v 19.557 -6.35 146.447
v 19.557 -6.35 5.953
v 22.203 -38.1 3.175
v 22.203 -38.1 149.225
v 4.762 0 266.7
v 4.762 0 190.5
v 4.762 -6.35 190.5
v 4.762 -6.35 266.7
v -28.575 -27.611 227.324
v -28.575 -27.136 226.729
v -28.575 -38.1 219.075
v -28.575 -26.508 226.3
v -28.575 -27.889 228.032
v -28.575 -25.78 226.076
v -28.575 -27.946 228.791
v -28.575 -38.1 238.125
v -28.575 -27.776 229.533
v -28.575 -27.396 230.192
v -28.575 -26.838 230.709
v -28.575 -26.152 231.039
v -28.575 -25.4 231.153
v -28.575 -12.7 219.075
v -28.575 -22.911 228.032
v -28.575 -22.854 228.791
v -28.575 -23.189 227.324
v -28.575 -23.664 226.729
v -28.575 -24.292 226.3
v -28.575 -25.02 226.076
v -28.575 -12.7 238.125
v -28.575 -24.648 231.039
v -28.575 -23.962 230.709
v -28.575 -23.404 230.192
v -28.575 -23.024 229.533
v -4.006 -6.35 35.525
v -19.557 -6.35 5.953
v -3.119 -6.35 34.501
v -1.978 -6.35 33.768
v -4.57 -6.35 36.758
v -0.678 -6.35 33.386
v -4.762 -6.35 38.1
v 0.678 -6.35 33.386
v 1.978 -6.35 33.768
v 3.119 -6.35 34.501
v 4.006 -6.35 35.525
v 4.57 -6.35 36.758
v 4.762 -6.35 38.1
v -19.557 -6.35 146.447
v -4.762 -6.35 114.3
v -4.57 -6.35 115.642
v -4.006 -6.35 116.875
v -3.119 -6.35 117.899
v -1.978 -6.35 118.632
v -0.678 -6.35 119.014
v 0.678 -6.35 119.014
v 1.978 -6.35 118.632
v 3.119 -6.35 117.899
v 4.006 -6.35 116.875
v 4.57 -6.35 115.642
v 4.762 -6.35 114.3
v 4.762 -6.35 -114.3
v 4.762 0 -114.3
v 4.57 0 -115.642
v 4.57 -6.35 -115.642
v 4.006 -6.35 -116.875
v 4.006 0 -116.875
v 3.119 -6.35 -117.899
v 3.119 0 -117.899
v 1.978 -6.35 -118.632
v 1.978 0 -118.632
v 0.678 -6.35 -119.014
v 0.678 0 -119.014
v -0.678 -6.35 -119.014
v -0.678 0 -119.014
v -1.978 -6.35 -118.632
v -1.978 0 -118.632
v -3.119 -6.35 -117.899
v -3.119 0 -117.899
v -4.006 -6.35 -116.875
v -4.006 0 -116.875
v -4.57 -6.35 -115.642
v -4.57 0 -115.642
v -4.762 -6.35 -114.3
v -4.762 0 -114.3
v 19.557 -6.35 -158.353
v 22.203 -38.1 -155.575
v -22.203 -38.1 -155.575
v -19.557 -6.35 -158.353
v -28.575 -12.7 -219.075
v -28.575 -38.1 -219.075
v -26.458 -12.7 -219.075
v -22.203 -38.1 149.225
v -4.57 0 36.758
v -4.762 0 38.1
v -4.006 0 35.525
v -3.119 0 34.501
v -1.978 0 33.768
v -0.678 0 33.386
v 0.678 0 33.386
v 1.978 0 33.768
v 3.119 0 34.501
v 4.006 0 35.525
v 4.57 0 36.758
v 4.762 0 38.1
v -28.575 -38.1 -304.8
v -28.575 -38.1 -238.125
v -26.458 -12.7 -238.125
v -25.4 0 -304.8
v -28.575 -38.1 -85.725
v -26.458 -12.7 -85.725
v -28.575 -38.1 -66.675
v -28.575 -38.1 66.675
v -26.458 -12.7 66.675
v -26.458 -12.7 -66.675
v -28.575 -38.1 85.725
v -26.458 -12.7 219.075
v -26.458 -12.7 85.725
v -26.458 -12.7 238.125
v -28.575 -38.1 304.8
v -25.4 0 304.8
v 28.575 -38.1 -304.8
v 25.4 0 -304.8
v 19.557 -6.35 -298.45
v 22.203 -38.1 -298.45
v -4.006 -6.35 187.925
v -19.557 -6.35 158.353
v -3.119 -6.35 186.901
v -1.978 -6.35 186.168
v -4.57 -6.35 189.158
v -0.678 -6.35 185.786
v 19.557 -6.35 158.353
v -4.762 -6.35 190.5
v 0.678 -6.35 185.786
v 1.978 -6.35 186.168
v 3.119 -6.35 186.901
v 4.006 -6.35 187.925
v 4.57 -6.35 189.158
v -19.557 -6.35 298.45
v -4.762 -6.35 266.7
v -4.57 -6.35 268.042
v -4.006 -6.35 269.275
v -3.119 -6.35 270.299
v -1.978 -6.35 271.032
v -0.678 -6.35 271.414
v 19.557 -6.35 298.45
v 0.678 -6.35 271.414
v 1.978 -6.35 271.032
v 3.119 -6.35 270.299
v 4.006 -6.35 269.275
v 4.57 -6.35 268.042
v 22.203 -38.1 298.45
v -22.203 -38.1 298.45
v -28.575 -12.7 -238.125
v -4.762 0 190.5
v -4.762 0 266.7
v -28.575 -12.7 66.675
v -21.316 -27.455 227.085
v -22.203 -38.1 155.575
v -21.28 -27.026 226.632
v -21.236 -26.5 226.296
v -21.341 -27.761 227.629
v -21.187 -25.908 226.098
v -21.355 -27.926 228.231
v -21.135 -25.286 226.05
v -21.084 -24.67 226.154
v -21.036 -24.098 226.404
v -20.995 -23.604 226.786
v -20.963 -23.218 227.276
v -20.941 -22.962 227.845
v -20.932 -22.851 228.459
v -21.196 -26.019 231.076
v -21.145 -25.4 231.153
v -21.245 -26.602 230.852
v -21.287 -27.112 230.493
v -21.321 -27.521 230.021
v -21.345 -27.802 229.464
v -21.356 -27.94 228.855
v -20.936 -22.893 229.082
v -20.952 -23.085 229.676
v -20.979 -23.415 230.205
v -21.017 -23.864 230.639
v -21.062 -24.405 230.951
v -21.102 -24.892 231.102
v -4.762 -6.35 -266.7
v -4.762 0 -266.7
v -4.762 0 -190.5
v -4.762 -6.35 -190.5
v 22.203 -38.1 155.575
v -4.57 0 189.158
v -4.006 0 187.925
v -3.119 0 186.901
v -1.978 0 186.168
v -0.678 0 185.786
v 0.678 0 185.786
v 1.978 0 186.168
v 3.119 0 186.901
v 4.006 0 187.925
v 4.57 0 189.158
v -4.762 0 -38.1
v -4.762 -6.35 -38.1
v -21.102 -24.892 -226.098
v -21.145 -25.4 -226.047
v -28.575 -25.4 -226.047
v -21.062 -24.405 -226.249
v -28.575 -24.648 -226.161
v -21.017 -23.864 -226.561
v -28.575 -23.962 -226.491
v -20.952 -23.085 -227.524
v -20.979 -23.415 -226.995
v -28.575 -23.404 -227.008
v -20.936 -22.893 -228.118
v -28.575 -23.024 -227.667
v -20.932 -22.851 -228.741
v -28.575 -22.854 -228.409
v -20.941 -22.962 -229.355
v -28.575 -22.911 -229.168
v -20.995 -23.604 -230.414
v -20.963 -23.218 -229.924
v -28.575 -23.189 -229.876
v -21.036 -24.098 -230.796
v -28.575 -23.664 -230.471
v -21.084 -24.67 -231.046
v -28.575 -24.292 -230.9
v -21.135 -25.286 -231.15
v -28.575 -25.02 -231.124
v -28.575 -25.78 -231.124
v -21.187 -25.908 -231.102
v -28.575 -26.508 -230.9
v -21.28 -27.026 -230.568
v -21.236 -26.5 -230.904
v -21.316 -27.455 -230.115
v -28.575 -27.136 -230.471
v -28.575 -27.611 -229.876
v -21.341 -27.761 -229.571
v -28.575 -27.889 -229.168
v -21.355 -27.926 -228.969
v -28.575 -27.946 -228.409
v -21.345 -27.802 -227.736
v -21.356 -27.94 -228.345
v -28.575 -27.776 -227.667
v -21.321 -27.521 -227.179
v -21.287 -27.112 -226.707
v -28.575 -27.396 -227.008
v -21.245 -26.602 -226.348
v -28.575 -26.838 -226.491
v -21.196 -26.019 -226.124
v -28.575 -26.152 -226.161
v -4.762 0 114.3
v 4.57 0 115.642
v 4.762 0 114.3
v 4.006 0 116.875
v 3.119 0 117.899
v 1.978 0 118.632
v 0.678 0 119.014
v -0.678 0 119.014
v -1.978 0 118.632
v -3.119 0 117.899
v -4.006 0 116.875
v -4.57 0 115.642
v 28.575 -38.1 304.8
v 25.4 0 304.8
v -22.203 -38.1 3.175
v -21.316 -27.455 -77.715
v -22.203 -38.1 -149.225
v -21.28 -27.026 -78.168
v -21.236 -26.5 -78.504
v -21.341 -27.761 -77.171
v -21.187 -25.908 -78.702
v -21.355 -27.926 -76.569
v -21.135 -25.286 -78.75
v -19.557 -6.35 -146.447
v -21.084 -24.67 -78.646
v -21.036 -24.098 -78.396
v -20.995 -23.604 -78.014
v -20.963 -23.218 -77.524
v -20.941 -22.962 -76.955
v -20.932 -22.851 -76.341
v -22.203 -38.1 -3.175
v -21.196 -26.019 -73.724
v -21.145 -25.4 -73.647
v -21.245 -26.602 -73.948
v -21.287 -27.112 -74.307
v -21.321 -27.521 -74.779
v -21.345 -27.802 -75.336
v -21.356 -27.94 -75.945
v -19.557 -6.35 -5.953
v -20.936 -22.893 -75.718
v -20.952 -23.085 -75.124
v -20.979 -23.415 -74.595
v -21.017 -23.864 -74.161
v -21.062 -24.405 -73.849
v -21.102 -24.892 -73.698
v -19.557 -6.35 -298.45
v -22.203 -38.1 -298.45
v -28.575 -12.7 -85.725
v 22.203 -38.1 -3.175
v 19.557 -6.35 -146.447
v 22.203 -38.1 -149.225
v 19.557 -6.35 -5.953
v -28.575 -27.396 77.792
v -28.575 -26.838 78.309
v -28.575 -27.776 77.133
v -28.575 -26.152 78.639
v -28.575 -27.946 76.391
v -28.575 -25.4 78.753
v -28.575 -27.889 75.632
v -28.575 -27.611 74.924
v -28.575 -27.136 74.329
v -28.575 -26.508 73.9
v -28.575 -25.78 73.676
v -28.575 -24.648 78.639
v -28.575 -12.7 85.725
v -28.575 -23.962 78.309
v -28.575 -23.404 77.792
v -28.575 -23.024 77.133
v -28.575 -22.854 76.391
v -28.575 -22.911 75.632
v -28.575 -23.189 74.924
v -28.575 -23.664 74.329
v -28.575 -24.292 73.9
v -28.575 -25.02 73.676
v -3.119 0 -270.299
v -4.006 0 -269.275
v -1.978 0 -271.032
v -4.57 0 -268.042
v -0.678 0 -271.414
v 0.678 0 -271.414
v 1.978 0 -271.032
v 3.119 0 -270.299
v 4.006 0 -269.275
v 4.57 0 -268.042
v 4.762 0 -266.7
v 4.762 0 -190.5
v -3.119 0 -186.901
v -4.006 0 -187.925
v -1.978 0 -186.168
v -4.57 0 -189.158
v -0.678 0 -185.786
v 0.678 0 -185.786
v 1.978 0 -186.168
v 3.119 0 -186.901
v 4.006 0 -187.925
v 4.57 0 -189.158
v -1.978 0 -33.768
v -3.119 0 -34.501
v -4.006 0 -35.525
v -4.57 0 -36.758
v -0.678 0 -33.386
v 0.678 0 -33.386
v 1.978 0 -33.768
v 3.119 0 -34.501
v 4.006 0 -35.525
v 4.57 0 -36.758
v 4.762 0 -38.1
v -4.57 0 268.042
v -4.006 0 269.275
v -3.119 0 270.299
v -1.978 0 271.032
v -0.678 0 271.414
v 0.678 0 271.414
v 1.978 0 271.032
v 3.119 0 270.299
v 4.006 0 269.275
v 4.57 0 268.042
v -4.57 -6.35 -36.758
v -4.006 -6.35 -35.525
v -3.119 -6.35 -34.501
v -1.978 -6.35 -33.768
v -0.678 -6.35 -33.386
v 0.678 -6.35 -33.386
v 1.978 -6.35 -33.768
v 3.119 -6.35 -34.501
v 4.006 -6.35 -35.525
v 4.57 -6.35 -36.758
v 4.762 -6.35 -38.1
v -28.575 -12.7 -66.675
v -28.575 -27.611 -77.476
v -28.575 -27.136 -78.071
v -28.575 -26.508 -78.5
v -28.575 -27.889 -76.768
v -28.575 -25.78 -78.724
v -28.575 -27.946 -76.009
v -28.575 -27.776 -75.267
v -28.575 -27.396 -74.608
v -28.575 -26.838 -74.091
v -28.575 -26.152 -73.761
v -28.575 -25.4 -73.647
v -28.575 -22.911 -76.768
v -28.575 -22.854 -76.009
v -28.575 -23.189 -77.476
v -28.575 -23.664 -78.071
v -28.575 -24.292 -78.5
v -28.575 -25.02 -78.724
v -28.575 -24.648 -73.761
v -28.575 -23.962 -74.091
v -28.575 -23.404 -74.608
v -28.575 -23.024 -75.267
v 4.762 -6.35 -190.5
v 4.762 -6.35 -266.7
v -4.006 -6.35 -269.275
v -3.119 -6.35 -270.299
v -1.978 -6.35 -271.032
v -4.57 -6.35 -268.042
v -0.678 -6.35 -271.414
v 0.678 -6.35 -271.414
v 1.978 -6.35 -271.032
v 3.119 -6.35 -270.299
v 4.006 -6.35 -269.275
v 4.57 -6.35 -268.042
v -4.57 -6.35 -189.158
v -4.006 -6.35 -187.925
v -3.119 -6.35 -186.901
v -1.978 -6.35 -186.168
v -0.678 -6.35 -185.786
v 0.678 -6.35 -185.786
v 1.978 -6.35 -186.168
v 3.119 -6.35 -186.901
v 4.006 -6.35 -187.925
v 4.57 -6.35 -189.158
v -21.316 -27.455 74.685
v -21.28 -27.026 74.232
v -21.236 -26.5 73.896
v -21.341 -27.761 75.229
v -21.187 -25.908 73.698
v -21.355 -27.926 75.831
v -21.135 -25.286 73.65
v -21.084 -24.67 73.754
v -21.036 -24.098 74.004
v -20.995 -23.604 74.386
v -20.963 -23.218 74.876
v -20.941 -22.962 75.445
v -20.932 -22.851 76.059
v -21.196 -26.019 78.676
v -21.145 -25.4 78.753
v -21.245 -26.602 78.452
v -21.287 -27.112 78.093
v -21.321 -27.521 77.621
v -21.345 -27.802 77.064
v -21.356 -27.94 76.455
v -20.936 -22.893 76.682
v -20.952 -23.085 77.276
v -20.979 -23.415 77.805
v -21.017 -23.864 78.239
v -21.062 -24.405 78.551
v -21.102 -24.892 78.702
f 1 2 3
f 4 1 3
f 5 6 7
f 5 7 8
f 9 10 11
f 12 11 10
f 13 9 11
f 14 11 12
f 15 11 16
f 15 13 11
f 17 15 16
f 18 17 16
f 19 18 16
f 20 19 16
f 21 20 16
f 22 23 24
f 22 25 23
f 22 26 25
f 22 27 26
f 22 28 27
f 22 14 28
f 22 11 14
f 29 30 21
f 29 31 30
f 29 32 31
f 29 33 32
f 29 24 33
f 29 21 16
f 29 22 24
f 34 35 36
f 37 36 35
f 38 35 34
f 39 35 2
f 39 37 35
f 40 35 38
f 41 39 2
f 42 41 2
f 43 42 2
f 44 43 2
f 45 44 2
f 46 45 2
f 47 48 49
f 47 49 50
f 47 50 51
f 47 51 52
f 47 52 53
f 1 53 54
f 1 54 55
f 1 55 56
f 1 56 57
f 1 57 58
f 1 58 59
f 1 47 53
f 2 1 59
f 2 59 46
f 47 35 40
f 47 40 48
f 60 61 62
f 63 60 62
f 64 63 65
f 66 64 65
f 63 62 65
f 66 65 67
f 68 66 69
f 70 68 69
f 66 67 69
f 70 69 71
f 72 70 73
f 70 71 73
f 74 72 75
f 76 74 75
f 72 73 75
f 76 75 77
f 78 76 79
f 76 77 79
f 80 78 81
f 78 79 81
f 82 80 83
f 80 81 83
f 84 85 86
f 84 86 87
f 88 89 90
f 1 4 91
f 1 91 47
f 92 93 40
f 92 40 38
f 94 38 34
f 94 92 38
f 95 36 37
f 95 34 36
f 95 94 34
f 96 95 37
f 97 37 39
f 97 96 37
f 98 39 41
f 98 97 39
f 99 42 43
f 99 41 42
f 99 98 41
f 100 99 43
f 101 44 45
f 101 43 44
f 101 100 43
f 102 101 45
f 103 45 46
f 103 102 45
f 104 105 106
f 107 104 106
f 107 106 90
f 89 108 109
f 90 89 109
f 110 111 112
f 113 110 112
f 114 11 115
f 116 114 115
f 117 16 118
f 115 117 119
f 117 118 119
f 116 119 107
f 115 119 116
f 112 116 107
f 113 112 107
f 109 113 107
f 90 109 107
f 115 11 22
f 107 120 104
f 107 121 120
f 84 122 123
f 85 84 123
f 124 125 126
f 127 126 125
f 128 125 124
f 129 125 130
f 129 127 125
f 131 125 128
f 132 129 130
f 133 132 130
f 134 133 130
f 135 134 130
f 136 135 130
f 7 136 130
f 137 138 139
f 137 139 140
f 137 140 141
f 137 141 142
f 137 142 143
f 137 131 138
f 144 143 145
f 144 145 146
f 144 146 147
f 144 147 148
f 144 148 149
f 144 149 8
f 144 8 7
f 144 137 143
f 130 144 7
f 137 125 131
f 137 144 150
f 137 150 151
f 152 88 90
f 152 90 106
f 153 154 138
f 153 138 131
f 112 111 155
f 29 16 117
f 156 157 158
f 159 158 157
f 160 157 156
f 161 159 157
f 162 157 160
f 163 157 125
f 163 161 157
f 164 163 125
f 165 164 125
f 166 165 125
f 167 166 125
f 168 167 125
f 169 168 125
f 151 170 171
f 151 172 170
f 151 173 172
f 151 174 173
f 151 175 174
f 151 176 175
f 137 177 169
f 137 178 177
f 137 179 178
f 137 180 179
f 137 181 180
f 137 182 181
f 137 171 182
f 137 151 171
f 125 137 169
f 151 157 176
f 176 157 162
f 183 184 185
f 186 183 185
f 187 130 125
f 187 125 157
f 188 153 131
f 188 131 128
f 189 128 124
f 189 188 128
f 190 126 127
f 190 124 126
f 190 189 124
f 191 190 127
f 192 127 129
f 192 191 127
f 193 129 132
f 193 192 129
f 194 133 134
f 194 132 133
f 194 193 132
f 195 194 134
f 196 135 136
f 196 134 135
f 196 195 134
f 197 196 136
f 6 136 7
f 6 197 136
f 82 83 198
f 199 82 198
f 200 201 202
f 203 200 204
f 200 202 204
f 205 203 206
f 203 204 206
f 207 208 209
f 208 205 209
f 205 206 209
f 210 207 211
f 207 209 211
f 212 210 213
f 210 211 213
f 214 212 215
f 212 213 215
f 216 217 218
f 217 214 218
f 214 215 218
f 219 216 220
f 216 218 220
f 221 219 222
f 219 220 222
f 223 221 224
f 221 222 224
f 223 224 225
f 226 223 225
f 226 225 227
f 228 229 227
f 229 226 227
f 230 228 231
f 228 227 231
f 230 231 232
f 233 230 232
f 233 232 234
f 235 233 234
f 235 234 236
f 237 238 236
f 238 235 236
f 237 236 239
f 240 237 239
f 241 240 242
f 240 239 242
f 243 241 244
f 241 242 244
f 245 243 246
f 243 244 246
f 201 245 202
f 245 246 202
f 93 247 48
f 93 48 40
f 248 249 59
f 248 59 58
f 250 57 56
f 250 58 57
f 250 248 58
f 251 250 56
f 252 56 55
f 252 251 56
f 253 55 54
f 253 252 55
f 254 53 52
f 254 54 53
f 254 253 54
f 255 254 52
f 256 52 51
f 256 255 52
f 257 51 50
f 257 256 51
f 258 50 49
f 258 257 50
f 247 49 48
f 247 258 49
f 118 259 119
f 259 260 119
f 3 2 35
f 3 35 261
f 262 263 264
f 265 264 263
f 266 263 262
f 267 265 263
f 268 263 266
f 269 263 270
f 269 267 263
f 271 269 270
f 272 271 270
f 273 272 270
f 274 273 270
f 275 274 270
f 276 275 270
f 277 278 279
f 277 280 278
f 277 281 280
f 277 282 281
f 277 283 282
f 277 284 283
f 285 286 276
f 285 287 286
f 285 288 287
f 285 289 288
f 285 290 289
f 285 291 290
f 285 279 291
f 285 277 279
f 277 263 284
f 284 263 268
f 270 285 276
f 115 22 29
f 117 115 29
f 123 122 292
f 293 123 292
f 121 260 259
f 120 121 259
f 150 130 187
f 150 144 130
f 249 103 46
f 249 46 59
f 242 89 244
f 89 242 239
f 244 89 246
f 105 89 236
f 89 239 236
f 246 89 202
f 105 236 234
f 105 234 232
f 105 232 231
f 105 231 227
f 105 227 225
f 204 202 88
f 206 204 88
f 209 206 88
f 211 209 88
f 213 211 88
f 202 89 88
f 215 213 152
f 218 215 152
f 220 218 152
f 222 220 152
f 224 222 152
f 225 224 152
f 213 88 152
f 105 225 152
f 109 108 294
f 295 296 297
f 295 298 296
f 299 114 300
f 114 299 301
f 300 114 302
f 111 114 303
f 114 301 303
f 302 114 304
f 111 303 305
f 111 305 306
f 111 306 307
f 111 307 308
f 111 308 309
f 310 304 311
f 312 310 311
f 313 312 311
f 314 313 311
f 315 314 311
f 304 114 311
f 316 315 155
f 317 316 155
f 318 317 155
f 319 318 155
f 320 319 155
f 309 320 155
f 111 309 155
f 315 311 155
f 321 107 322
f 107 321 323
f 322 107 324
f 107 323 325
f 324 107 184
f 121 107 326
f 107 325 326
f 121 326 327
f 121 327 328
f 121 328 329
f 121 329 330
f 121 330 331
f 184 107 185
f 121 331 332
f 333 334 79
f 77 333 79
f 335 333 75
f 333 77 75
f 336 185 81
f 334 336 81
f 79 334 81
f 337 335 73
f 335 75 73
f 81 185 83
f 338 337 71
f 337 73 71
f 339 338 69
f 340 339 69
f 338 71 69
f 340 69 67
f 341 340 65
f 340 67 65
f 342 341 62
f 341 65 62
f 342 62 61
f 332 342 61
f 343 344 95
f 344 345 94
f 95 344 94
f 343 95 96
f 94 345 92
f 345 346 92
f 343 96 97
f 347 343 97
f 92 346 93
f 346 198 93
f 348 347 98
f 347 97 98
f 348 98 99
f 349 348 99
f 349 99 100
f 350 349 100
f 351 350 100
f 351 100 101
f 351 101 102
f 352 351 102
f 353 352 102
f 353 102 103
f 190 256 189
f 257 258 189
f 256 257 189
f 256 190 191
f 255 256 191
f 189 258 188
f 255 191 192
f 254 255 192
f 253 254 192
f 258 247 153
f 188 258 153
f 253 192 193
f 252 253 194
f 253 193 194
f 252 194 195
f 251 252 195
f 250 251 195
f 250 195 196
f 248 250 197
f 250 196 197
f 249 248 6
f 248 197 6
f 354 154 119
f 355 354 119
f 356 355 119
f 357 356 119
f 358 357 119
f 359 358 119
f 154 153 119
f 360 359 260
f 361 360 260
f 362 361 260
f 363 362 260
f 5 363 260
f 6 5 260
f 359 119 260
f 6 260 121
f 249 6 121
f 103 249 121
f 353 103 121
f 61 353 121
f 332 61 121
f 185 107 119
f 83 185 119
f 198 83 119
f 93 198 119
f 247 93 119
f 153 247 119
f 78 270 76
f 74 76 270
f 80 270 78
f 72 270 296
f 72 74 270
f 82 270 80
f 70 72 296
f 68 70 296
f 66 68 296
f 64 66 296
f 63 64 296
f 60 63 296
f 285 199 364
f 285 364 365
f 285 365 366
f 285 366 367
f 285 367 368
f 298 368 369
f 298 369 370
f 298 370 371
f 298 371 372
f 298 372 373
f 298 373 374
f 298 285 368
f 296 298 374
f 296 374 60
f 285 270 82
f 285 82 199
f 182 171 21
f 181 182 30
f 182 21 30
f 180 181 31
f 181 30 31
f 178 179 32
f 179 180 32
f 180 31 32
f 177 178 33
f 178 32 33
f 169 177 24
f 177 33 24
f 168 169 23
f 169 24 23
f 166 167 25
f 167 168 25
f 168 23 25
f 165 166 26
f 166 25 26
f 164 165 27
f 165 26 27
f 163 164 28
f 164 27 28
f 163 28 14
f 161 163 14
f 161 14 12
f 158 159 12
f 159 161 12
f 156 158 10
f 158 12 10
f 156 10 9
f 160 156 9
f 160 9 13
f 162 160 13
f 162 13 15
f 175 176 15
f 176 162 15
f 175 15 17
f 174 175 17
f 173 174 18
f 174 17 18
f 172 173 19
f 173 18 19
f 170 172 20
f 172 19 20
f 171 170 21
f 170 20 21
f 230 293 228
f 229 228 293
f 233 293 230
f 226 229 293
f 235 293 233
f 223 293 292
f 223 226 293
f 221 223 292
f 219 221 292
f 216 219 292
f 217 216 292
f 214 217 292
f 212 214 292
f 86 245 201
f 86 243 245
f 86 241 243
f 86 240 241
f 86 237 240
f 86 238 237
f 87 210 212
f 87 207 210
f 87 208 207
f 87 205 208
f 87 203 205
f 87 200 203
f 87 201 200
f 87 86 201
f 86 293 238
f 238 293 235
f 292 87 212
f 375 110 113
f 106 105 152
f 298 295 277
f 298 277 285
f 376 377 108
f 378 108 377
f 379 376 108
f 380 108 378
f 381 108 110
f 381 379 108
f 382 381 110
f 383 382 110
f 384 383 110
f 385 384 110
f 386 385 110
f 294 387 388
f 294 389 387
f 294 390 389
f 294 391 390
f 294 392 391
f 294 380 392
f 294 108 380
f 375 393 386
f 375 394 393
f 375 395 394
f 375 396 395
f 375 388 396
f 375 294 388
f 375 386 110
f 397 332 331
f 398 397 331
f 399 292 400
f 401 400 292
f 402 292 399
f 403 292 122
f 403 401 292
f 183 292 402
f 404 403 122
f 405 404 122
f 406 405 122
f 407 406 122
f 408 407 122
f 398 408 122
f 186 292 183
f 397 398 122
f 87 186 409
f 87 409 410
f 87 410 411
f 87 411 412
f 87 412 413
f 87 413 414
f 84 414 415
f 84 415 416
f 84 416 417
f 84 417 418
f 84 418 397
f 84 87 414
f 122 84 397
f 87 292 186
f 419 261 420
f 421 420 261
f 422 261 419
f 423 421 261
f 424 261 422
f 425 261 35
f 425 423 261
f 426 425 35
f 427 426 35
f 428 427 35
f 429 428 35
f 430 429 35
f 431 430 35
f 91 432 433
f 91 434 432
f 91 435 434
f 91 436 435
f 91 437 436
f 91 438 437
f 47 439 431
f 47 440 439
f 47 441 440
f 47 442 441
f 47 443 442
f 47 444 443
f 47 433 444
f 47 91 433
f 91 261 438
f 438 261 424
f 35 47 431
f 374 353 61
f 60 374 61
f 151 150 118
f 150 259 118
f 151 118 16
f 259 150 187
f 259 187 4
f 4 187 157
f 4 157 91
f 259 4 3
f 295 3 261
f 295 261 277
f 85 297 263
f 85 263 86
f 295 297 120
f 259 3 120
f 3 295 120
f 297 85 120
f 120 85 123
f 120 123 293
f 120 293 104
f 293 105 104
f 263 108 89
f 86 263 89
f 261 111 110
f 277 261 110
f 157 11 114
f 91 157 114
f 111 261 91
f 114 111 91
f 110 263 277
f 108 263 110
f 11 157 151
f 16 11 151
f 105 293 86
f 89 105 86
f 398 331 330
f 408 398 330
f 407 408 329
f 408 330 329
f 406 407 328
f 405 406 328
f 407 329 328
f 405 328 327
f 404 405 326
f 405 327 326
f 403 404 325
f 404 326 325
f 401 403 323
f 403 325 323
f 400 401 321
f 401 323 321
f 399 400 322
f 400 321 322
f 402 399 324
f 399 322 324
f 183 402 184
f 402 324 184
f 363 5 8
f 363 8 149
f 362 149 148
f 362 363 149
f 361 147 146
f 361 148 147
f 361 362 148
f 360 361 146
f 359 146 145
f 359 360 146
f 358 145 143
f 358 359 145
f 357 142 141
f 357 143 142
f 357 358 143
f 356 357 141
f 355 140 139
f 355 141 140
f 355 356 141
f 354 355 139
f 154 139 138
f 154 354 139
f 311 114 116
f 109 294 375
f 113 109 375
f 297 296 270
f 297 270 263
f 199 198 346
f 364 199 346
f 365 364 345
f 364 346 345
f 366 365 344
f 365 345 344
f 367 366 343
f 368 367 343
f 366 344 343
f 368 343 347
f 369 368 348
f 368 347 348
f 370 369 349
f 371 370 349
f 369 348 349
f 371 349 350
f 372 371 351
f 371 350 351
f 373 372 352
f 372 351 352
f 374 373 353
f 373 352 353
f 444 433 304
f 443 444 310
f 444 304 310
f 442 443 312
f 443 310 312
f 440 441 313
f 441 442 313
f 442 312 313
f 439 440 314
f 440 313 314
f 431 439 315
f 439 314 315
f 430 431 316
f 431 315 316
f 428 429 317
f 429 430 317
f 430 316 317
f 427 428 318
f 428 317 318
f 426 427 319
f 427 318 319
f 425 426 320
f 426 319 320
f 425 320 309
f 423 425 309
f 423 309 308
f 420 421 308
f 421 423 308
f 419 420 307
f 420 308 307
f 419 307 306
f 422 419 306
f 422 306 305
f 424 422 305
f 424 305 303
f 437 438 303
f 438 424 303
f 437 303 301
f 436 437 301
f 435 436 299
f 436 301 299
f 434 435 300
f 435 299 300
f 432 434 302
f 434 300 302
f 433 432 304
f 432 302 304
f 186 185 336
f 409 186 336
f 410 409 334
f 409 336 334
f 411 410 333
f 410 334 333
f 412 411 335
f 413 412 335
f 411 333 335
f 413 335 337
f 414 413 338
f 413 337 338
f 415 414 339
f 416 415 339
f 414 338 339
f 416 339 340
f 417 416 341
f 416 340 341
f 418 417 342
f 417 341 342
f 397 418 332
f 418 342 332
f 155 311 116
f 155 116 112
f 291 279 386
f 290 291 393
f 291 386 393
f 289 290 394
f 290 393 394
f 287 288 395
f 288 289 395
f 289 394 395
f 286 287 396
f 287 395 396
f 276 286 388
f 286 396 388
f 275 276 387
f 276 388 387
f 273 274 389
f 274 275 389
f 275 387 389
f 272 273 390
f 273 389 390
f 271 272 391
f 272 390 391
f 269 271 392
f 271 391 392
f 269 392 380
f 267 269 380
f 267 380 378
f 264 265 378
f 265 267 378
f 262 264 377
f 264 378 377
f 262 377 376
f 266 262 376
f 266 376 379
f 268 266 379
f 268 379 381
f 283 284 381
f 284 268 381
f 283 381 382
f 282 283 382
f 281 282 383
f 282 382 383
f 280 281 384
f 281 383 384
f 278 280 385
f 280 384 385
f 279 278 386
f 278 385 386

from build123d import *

# Parameters (mm, degrees)
BOSS_EXTRUDE1_DEPTH          = 304.8
SHELL1_T                     = -6.35
CUT_EXTRUDE1_DEPTH           = 309.49826681
RIB2_START                   = -22.202989535
RIB2_DEPTH                   = 44.40597907
LPATTERN1_COUNT              = 3
LPATTERN1_PITCH              = 152.4
LPATTERN2_COUNT              = 2
LPATTERN2_PITCH              = 152.4
MIRROR1_COPY_1_DEPTH         = 309.49826681
BOSS_EXTRUDE2_REACH          = 314.443
SKETCH5_W                    = 19.05
SKETCH5_H                    = 25.4
MIRROR4_COPY_1_REACH         = 314.443
MIRROR4_COPY_1_SKETCH_W      = 19.05
MIRROR4_COPY_1_SKETCH_H      = 25.4
F_1_4_20_TAPPED_HOLE1_REACH  = 314.443
F_1_4_20_TAPPED_HOLE1_BORE_R = 2.5527


# Read off the part's stored shape, not the designer's step: Rib2
with BuildPart() as part:
    # Sketch1 → Boss-Extrude1 (new, symmetric)
    with BuildSketch(Plane.XY):
        Polygon((28.575, -38.1), (-28.575, -38.1), (-25.4, 0), (25.4, 0), align=None)
    extrude(amount=BOSS_EXTRUDE1_DEPTH, both=True)

    # Shell1
    shell1_openings = [part.faces().sort_by_distance(p)[0] for p in [
        (0, -38.1, 0),
    ]]
    offset(amount=SHELL1_T, openings=shell1_openings, kind=Kind.INTERSECTION)

    # Sketch2 → Cut-Extrude1 (cut, symmetric)
    with BuildSketch(Plane(origin=(0, 0, 0), x_dir=(1, 0, 0), z_dir=(0, 1, 0))):
        with BuildLine():
            Line((4.7625, -38.1), (4.7625, -114.3))
            ThreePointArc((4.7625, -114.3), (0, -119.0625), (-4.7625, -114.3))
            Line((-4.7625, -114.3), (-4.7625, -38.1))
            ThreePointArc((-4.7625, -38.1), (0, -33.3375), (4.7625, -38.1))
        make_face()
    cut_extrude1 = extrude(amount=CUT_EXTRUDE1_DEPTH, both=True, mode=Mode.SUBTRACT)

    # Rib2 outline → Rib2 (add)
    with BuildSketch(Plane.YZ.offset(RIB2_START)):
        Polygon((-6.35, 146.447234933), (-6.35, 158.352765067), (-38.1, 155.575), (-38.1, 149.225), align=None)
    rib2 = extrude(amount=RIB2_DEPTH)

    # LPattern1: Rib2 ×3
    with Locations(*[(0, 0, -i * LPATTERN1_PITCH) for i in range(1, LPATTERN1_COUNT)]):
        add(rib2)

    # LPattern2: Cut-Extrude1 ×2
    with Locations(*[(0, 0, i * LPATTERN2_PITCH) for i in range(1, LPATTERN2_COUNT)]):
        add(cut_extrude1, mode=Mode.SUBTRACT)

    # Mirror1: Cut-Extrude1 across plane
    add(cut_extrude1.mirror(Plane.XY), mode=Mode.SUBTRACT)

    # Mirror1 copy 1 sketch → Mirror1 copy 1 (cut, symmetric)
    with BuildSketch(Plane(origin=(0, 0, -152.4), x_dir=(1, 0, 0), z_dir=(0, 1, 0))):
        with BuildLine():
            Line((4.7625, 38.1), (4.7625, 114.3))
            ThreePointArc((4.7625, 114.3), (0, 119.0625), (-4.7625, 114.3))
            Line((-4.7625, 114.3), (-4.7625, 38.1))
            ThreePointArc((-4.7625, 38.1), (0, 33.3375), (4.7625, 38.1))
        make_face()
    extrude(amount=MIRROR1_COPY_1_DEPTH, both=True, mode=Mode.SUBTRACT)

    # Sketch5 → Boss-Extrude2 (add, up to next)
    with BuildSketch(Plane(origin=(-28.575, 0, 0), x_dir=(0, 0, -1), z_dir=(1, 0, 0)), mode=Mode.PRIVATE) as boss_extrude2_sk1:
        with Locations((-76.2, -25.4)):
            Rectangle(SKETCH5_W, SKETCH5_H)
    boss_extrude2_tool1 = extrude(boss_extrude2_sk1.sketch, amount=BOSS_EXTRUDE2_REACH, mode=Mode.PRIVATE) - part.part
    boss_extrude2 = boss_extrude2_tool1.solids().sort_by_distance((-28.575, -25.4, 76.2))[0]
    add(boss_extrude2)

    # Mirror2: Boss-Extrude2 across plane
    add(boss_extrude2.mirror(Plane.XY))

    # Mirror3: Boss-Extrude2 across plane
    add(boss_extrude2.mirror(Plane.XY.offset(152.4)))

    # Mirror4 copy 1 sketch → Mirror4 copy 1 (add, up to next)
    with BuildSketch(Plane(origin=(-28.575, 0, -304.8), x_dir=(0, 0, -1), z_dir=(1, 0, 0)), mode=Mode.PRIVATE) as mirror4_copy_1_sk1:
        with Locations((-76.2, -25.4)):
            Rectangle(MIRROR4_COPY_1_SKETCH_W, MIRROR4_COPY_1_SKETCH_H)
    mirror4_copy_1_tool1 = extrude(mirror4_copy_1_sk1.sketch, amount=MIRROR4_COPY_1_REACH, mode=Mode.PRIVATE) - part.part
    add(mirror4_copy_1_tool1.solids().sort_by_distance((-28.575, -25.4, -228.6))[0])

    # 1/4-20 Tapped Hole1 bore → 1/4-20 Tapped Hole1 (cut, up to next)
    with BuildSketch(Plane.ZY.offset(28.575), mode=Mode.PRIVATE) as f_1_4_20_tapped_hole1_sk1:
        with Locations((-228.6, -25.4)):
            Circle(F_1_4_20_TAPPED_HOLE1_BORE_R)
    f_1_4_20_tapped_hole1_tool1 = extrude(f_1_4_20_tapped_hole1_sk1.sketch, amount=-F_1_4_20_TAPPED_HOLE1_REACH, mode=Mode.PRIVATE) & part.part
    # 1/4-20 Tapped Hole1 bore → 1/4-20 Tapped Hole1 (cut, up to next)
    with BuildSketch(Plane.ZY.offset(28.575), mode=Mode.PRIVATE) as f_1_4_20_tapped_hole1_sk2:
        with Locations((-76.2, -25.4)):
            Circle(F_1_4_20_TAPPED_HOLE1_BORE_R)
    f_1_4_20_tapped_hole1_tool2 = extrude(f_1_4_20_tapped_hole1_sk2.sketch, amount=-F_1_4_20_TAPPED_HOLE1_REACH, mode=Mode.PRIVATE) & part.part
    # 1/4-20 Tapped Hole1 bore → 1/4-20 Tapped Hole1 (cut, up to next)
    with BuildSketch(Plane.ZY.offset(28.575), mode=Mode.PRIVATE) as f_1_4_20_tapped_hole1_sk3:
        with Locations((76.2, -25.4)):
            Circle(F_1_4_20_TAPPED_HOLE1_BORE_R)
    f_1_4_20_tapped_hole1_tool3 = extrude(f_1_4_20_tapped_hole1_sk3.sketch, amount=-F_1_4_20_TAPPED_HOLE1_REACH, mode=Mode.PRIVATE) & part.part
    # 1/4-20 Tapped Hole1 bore → 1/4-20 Tapped Hole1 (cut, up to next)
    with BuildSketch(Plane.ZY.offset(28.575), mode=Mode.PRIVATE) as f_1_4_20_tapped_hole1_sk4:
        with Locations((228.6, -25.4)):
            Circle(F_1_4_20_TAPPED_HOLE1_BORE_R)
    f_1_4_20_tapped_hole1_tool4 = extrude(f_1_4_20_tapped_hole1_sk4.sketch, amount=-F_1_4_20_TAPPED_HOLE1_REACH, mode=Mode.PRIVATE) & part.part
    add(f_1_4_20_tapped_hole1_tool1.solids().sort_by_distance((-28.575, -25.4, -228.6))[0], mode=Mode.SUBTRACT)
    add(f_1_4_20_tapped_hole1_tool2.solids().sort_by_distance((-28.575, -25.4, -76.2))[0], mode=Mode.SUBTRACT)
    add(f_1_4_20_tapped_hole1_tool3.solids().sort_by_distance((-28.575, -25.4, 76.2))[0], mode=Mode.SUBTRACT)
    add(f_1_4_20_tapped_hole1_tool4.solids().sort_by_distance((-28.575, -25.4, 228.6))[0], mode=Mode.SUBTRACT)


solid = part.part
